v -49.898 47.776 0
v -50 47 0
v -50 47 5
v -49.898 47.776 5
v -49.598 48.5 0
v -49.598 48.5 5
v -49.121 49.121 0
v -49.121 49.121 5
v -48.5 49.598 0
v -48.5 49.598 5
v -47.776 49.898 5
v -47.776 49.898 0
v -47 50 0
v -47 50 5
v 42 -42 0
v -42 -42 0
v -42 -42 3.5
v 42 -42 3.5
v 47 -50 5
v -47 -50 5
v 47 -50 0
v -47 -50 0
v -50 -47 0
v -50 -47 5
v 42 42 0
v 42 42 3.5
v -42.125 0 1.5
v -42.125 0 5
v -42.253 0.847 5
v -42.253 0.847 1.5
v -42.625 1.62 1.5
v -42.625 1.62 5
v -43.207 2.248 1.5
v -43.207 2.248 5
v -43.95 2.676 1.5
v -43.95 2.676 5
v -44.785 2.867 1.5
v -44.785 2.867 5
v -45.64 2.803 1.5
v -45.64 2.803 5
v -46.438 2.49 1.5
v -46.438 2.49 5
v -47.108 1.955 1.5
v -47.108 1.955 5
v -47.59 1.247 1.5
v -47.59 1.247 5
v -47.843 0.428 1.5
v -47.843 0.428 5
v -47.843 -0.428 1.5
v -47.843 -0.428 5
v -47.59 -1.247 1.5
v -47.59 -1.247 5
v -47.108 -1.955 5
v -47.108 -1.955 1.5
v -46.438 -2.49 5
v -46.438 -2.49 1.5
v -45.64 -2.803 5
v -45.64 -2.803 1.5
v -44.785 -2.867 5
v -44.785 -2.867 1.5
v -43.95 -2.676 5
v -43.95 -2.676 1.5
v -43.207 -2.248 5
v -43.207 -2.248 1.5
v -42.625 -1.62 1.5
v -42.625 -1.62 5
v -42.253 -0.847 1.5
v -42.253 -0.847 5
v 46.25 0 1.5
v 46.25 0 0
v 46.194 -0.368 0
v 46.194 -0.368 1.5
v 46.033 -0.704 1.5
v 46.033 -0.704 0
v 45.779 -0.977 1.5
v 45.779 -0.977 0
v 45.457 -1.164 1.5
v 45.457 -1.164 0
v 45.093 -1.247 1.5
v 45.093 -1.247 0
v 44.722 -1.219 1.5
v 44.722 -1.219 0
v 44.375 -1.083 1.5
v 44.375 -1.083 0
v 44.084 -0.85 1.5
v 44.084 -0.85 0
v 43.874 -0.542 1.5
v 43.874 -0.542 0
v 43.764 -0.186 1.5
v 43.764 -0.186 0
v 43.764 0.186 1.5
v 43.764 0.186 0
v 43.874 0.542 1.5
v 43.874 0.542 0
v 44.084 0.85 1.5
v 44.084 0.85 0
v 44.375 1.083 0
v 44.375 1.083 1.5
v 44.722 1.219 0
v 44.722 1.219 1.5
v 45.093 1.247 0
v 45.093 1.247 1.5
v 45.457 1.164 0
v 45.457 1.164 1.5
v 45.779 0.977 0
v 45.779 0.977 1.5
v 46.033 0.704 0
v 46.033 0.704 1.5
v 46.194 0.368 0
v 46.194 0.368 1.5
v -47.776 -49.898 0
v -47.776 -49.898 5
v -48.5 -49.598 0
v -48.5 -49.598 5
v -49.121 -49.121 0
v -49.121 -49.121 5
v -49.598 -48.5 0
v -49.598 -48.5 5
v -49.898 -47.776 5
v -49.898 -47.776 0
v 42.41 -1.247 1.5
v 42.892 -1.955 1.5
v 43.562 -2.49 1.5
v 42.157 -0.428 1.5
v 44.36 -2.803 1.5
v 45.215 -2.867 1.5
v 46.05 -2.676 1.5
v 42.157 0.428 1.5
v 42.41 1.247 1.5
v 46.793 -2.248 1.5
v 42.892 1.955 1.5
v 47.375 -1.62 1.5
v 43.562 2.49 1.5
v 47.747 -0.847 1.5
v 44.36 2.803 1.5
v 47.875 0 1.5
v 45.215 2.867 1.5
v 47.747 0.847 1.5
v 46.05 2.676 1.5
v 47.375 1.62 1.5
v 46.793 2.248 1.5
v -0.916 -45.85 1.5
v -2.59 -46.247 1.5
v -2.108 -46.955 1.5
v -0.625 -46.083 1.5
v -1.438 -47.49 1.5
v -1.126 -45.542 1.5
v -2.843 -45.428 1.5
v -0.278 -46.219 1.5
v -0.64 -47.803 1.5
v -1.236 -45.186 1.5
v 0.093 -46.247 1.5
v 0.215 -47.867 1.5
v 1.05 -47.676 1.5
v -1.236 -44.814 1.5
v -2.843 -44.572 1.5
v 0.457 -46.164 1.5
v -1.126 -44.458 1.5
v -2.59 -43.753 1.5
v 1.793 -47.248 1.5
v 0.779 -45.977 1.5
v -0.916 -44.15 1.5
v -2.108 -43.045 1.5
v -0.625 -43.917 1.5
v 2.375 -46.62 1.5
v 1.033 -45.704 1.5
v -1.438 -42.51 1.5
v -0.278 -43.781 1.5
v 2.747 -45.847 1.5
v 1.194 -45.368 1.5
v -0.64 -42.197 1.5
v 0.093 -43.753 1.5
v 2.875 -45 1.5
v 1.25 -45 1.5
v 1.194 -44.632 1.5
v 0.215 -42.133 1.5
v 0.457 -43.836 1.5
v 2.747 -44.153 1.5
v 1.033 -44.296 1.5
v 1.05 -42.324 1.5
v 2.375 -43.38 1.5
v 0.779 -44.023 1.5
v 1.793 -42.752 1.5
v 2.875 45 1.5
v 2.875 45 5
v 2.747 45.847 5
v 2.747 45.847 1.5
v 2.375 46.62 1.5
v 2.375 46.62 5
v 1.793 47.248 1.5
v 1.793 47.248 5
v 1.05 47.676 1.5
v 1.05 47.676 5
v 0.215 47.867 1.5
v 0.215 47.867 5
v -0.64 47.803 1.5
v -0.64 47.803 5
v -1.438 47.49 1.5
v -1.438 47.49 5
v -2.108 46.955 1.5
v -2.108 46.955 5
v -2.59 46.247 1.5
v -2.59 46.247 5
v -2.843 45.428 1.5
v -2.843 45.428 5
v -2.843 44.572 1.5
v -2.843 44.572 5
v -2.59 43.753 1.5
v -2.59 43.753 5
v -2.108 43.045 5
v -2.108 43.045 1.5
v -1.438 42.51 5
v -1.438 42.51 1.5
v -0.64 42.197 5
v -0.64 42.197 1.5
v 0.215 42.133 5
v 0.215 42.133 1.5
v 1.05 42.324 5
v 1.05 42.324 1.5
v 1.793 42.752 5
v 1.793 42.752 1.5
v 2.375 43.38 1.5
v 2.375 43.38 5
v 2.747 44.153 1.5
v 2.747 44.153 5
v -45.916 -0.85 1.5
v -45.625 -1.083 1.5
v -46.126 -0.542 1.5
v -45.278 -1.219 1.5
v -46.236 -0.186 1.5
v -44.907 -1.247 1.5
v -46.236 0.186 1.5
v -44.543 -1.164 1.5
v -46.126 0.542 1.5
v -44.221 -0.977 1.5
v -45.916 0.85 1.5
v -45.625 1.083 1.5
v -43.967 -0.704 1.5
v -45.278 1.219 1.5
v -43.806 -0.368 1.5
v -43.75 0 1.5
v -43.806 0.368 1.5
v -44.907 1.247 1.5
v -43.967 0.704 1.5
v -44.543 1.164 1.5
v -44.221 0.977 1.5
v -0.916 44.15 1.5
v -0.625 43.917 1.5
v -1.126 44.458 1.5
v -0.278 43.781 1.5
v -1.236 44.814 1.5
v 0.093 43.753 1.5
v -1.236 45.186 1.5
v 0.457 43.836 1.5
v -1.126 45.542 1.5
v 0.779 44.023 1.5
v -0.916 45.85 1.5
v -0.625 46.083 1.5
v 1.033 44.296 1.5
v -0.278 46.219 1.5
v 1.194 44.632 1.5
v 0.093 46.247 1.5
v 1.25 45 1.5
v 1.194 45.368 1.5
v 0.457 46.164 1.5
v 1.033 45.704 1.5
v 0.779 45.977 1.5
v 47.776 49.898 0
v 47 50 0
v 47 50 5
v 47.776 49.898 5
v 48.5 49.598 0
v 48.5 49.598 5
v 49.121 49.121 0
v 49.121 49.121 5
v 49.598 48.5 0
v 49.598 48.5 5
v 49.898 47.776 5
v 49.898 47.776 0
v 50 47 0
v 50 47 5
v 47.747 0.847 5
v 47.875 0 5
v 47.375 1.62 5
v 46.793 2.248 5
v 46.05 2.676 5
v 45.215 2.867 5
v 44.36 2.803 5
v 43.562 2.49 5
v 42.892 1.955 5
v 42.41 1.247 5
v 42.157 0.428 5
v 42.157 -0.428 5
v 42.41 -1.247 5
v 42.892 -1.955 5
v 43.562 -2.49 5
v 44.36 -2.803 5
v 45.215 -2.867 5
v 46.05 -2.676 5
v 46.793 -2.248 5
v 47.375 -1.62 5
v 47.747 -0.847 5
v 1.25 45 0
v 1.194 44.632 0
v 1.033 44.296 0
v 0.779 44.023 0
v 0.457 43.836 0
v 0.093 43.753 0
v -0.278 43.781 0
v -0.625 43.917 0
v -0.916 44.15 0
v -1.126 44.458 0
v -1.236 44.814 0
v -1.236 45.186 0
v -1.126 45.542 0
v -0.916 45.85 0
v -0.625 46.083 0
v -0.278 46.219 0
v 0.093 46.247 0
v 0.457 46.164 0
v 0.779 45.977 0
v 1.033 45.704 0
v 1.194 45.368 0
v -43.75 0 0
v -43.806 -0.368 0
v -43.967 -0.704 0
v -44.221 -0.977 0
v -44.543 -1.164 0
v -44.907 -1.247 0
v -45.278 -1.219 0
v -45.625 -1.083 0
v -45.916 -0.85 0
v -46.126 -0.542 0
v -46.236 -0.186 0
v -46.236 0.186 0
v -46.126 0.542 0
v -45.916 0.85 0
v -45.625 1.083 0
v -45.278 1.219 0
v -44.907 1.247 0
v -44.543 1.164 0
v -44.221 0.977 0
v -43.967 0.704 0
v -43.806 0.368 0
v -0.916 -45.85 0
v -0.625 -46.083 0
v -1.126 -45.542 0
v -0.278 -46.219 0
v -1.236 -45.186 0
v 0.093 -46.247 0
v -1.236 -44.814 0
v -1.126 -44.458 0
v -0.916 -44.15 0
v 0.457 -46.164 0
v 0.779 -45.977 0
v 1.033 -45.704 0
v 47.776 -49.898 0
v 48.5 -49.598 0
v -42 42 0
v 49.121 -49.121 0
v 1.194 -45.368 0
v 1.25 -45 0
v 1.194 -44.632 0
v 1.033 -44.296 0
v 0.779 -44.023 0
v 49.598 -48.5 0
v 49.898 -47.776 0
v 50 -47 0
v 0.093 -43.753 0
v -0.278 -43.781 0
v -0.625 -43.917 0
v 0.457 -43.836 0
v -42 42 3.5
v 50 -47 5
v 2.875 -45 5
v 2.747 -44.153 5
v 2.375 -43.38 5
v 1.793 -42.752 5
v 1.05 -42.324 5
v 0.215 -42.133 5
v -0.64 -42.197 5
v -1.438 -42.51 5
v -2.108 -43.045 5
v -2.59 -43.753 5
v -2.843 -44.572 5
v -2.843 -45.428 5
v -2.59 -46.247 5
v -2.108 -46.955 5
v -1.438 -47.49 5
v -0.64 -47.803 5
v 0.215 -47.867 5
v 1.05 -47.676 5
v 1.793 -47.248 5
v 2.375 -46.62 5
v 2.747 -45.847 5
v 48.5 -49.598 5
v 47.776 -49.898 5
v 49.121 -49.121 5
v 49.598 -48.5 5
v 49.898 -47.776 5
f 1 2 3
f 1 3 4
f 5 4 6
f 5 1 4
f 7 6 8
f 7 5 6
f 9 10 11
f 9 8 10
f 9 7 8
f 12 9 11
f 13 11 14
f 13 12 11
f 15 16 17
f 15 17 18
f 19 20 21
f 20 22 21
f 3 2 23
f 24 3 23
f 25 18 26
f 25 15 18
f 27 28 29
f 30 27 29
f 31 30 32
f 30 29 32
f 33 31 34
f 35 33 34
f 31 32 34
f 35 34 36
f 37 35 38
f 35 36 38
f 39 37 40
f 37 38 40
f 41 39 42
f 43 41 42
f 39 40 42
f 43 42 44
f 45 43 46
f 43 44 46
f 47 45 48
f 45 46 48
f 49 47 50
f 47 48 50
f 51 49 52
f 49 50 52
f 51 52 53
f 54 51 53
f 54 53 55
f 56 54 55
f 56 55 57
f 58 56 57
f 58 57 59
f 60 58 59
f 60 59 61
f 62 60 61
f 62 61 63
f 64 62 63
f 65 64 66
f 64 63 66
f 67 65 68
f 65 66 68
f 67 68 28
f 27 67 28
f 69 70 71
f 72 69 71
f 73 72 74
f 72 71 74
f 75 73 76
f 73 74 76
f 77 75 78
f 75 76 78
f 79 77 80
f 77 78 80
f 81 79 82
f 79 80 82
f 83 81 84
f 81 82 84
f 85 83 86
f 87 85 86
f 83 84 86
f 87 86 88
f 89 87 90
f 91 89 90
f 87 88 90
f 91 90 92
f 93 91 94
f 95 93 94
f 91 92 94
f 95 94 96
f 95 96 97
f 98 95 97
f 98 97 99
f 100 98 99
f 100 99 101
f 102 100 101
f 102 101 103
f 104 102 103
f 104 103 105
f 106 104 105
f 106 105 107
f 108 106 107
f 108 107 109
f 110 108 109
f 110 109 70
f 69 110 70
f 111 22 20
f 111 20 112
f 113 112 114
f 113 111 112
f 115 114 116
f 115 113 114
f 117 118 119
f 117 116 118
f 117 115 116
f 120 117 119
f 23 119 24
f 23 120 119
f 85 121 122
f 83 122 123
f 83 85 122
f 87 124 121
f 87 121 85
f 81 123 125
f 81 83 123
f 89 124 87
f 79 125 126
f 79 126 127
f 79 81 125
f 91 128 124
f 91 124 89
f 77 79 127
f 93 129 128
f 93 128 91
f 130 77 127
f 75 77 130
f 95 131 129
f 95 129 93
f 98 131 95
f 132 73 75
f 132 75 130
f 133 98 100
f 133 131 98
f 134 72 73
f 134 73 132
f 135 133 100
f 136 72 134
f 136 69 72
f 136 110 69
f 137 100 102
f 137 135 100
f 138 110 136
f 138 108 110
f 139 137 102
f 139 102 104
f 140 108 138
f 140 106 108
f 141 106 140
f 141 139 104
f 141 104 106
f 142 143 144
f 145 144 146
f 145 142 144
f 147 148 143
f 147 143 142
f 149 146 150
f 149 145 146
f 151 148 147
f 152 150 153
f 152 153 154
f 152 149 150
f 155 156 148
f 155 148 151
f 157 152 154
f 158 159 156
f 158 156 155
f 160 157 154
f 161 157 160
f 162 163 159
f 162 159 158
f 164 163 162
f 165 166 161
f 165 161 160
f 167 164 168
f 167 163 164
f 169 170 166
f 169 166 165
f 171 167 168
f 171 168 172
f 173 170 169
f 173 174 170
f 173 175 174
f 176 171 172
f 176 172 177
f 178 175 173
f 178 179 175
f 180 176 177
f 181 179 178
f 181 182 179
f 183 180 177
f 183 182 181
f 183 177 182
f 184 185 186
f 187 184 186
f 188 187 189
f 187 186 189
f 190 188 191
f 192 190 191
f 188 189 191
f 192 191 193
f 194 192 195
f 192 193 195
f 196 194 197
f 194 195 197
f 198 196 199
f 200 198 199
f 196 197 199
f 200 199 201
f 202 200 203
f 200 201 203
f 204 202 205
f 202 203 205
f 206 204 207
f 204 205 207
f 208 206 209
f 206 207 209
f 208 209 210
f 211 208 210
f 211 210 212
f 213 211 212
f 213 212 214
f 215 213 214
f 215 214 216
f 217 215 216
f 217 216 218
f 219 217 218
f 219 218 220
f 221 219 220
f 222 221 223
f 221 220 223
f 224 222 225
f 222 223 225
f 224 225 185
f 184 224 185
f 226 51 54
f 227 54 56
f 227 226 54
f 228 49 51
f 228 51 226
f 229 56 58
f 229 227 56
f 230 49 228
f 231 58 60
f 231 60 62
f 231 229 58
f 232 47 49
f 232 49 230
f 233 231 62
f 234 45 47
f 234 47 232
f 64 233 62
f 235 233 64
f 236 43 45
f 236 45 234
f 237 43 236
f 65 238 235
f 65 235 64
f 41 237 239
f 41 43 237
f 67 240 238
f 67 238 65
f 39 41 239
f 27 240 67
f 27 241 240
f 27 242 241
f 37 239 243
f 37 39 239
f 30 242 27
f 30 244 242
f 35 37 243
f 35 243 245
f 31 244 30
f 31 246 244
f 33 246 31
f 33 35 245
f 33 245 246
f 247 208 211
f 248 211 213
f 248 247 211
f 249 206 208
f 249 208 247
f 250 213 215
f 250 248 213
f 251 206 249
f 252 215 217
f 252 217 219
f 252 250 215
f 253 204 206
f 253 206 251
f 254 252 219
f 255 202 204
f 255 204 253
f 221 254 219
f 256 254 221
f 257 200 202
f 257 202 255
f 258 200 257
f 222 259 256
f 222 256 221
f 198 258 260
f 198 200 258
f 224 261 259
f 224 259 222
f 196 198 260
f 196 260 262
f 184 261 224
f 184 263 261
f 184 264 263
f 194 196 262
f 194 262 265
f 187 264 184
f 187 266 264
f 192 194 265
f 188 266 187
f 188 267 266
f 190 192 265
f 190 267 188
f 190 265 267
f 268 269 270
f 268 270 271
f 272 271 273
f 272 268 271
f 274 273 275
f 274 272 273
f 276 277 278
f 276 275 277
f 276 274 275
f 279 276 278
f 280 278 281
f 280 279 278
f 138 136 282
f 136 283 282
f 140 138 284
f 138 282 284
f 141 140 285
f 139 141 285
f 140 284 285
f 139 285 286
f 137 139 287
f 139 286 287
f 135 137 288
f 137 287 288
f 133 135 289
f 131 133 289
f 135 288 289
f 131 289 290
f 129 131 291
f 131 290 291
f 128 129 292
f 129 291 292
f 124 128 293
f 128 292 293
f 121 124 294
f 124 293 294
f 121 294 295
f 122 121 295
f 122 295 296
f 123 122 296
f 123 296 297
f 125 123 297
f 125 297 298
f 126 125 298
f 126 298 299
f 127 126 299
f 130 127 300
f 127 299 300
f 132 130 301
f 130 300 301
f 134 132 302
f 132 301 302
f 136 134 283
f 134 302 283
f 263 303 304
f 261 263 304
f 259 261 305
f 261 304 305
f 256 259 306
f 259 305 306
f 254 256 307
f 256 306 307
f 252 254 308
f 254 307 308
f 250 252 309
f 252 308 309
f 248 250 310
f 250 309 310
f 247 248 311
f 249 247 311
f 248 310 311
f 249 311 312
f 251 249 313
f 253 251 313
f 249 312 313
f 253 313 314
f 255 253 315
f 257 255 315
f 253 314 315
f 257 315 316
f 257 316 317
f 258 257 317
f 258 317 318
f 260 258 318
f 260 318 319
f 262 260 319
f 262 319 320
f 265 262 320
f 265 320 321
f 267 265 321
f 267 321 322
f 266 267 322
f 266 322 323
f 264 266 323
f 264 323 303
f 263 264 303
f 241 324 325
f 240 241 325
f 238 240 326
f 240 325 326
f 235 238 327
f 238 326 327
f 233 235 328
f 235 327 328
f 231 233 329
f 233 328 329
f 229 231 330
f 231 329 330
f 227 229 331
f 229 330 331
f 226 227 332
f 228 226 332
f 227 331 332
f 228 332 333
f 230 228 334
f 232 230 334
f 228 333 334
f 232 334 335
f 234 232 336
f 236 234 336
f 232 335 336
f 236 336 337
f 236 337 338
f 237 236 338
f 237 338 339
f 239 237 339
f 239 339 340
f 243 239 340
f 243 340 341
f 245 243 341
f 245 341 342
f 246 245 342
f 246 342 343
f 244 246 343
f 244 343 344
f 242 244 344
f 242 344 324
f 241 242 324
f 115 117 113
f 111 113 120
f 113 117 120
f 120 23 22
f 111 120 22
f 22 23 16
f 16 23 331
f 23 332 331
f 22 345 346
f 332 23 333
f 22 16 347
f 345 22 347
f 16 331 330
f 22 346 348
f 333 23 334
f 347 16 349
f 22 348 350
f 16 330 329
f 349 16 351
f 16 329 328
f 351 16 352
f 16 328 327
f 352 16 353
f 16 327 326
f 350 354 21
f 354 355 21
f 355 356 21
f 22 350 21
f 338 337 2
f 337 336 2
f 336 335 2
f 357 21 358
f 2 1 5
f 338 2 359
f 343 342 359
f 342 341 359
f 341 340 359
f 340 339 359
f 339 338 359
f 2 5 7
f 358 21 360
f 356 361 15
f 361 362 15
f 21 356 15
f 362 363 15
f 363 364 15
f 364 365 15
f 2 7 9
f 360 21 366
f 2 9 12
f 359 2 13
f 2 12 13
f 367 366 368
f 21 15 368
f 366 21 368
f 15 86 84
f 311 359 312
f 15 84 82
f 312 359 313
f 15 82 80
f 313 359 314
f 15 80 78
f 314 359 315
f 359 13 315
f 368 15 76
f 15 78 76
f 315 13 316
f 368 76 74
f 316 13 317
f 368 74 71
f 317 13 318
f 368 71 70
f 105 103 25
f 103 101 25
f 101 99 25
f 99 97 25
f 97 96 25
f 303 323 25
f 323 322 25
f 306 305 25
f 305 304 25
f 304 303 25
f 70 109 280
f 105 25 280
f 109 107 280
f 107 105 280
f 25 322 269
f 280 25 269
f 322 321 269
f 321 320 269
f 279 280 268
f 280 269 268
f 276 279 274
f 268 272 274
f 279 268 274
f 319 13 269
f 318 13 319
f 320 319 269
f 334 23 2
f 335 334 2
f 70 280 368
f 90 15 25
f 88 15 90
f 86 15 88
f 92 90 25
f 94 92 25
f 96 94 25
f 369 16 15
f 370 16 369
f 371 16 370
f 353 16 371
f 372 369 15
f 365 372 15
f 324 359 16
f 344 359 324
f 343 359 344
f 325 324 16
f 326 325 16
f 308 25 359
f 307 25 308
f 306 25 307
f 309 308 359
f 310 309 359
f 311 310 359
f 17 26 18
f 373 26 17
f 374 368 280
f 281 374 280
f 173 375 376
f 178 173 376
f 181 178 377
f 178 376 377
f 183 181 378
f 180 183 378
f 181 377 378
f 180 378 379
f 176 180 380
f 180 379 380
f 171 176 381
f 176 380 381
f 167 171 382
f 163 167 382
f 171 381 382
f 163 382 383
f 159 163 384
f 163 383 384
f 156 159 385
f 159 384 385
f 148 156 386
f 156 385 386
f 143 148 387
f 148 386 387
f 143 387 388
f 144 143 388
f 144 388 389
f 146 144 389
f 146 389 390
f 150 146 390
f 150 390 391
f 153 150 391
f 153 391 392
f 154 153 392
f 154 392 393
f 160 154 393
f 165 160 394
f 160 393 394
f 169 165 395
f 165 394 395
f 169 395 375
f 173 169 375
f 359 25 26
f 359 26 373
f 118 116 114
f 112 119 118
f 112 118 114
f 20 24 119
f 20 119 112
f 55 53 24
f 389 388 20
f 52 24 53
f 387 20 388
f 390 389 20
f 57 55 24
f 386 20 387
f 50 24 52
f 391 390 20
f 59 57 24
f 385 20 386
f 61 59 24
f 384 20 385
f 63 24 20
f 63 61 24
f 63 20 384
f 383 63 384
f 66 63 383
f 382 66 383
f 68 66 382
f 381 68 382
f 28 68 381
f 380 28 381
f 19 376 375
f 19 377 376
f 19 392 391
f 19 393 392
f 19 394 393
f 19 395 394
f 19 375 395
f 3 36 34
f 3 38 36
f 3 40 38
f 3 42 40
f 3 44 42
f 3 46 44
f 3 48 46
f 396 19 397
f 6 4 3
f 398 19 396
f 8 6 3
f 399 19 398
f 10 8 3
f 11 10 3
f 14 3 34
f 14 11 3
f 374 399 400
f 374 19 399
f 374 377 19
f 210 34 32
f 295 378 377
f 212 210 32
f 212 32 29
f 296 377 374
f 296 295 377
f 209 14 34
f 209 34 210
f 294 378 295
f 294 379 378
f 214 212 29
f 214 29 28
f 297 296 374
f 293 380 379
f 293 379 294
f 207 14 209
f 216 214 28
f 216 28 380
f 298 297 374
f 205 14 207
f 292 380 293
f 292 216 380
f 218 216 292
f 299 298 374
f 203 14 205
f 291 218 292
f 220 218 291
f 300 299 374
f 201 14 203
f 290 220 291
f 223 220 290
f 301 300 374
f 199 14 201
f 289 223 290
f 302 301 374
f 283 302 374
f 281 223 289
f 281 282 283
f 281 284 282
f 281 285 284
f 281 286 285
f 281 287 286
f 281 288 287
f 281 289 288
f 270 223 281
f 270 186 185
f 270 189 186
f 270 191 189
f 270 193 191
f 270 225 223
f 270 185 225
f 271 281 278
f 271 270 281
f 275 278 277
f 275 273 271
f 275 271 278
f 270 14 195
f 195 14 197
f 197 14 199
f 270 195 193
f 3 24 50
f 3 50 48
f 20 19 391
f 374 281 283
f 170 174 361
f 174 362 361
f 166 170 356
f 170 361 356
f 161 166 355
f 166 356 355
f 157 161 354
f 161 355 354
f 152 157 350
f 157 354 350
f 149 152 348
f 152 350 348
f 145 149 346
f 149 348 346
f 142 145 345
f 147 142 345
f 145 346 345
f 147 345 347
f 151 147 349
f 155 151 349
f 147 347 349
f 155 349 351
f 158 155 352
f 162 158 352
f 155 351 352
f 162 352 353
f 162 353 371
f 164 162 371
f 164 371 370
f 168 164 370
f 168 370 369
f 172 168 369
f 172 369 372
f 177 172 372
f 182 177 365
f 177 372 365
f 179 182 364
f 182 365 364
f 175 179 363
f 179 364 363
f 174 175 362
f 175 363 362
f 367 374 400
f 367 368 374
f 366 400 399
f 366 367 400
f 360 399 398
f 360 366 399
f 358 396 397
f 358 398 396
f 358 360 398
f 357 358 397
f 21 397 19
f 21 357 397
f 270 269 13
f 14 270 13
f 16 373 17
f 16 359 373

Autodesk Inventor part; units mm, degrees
ref_plane "YZ Plane" through (0, 0, 0) normal (1, 0, 0) x (0, 1, 0)
ref_plane "XZ Plane" through (0, 0, 0) normal (0, 1, 0) x (-1, 0, 0)
ref_plane "XY Plane" through (0, 0, 0) normal (0, 0, 1) x (1, 0, 0)
sketch "Sketch1" plane through (0, 0, 0) normal (0, 0, 1) x (1, 0, 0)
  line L0 (47, 50) -> (-47, 50) projected
  line L1 (-50, 47) -> (-50, -47) projected
  line L2 (-47, -50) -> (47, -50) projected
  line L3 (50, -47) -> (50, 47) projected
  line L4 (-48, 4) -> (-48, 48) projected
  line L5 (4, 48) -> (48, 48) projected
  line L6 (48, 48) -> (48, 4) projected
  line L7 (48, -48) -> (4, -48) projected
  arc A0 (47, -50) -> (50, -47) centre (47, -47) ccw projected
  arc A1 (50, 47) -> (47, 50) centre (47, 47) ccw projected
  arc A2 (-47, 50) -> (-50, 47) centre (-47, 47) ccw projected
  arc A3 (-50, -47) -> (-47, -50) centre (-47, -47) ccw projected
  circle A4 centre (0, -45) radius 1.25 projected
  circle A5 centre (0, 45) radius 1.25 projected
  circle A6 centre (-45, 0) radius 1.25 projected
  circle A7 centre (45, 0) radius 1.25 projected
  arc A8 (-43, -3) -> (-42, -2) centre (-43, -2) ccw projected
  line L8 (-42, -2) -> (-42, 2) projected
  arc A9 (-42, 2) -> (-43, 3) centre (-43, 2) ccw projected
  line L9 (-43, 3) -> (-47, 3) projected
  arc A10 (-48, 4) -> (-47, 3) centre (-47, 4) ccw projected
  arc A11 (-3, 47) -> (-4, 48) centre (-4, 47) ccw projected
  line L10 (-3, 47) -> (-3, 43) projected
  arc A12 (-3, 43) -> (-2, 42) centre (-2, 43) ccw projected
  line L11 (-2, 42) -> (2, 42) projected
  arc A13 (2, 42) -> (3, 43) centre (2, 43) ccw projected
  line L12 (3, 43) -> (3, 47) projected
  arc A14 (4, 48) -> (3, 47) centre (4, 47) ccw projected
  arc A15 (47, 3) -> (48, 4) centre (47, 4) ccw projected
  line L13 (47, 3) -> (43, 3) projected
  arc A16 (43, 3) -> (42, 2) centre (43, 2) ccw projected
  line L14 (42, 2) -> (42, -2) projected
  arc A17 (42, -2) -> (43, -3) centre (43, -2) ccw projected
  line L15 (43, -3) -> (47, -3) projected
  arc A18 (48, -4) -> (47, -3) centre (47, -4) ccw projected
  arc A19 (3, -47) -> (4, -48) centre (4, -47) ccw projected
  line L16 (3, -47) -> (3, -43) projected
  arc A20 (3, -43) -> (2, -42) centre (2, -43) ccw projected
  line L17 (2, -42) -> (-2, -42) projected
  arc A21 (-2, -42) -> (-3, -43) centre (-2, -43) ccw projected
  line L18 (-3, -43) -> (-3, -47) projected
  arc A22 (-4, -48) -> (-3, -47) centre (-4, -47) ccw projected
  arc A23 (-47, -3) -> (-48, -4) centre (-47, -4) ccw projected
  line L19 (-47, -3) -> (-43, -3) projected
  line L20 (-48, 48) -> (-4, 48) projected
  line L21 (48, -4) -> (48, -48) projected
  line L22 (-4, -48) -> (-48, -48) projected
  line L23 (-48, -48) -> (-48, -4) projected
  point P0 (0, 0)
  point P1 (-47, 4)
  point P2 (-4, 47)
  point P3 (4, 47)
  point P4 (47, 4)
  point P5 (47, -4)
  point P6 (4, -47)
  point P7 (-4, -47)
  point P8 (-47, -4)
extrude "Extrusion1" add sketch "Sketch1" along normal blind 5 contours A1 L3 A0 L2 A3 L1 A2 L0 | L4 L20 A11 L10 A12 L11 A13 L12 A14 L5 L6 A15 L13 A16 L14 A17 L15 A18 L21 L7 A19 L16 A20 L17 A21 L18 A22 L22 L23 A23 L19 A8 L8 A9 L9 A10
sketch "Sketch2" plane through (0, 0, 5) normal (0, 0, 1) x (1, 0, 0)
  circle A0 centre (45, 0) radius 1.25 projected
  circle A1 centre (45, 0) radius 2.875
  circle A2 centre (0, 45) radius 2.875
  circle A3 centre (-45, 0) radius 2.875
  circle A4 centre (0, -45) radius 2.875
  point P0 (0, 0)
  dimension "d2" = 5.75
  dimension "d5" = 360
extrude "Extrusion2" cut sketch "Sketch2" against normal blind 3.5 contours A0 | A1 | A2 | A3 | A4
sketch "Sketch3" plane through (0, 0, 0) normal (0, 0, -1) x (-1, 0, 0)
  line L0 (-42, 42) -> (42, 42)
  line L1 (42, 42) -> (42, -42)
  line L2 (42, -42) -> (-42, -42)
  line L3 (-42, -42) -> (-42, 42)
  line L4 (-42, 42) -> (42, -42) construction
  line L5 (42, 42) -> (-42, -42) construction
  point P0 (0, 0)
  dimension "d9" = 84
  dimension "d10" = 84
extrude "Extrusion3" cut sketch "Sketch3" against normal blind 3.5
properties part number "BaseBottom"
